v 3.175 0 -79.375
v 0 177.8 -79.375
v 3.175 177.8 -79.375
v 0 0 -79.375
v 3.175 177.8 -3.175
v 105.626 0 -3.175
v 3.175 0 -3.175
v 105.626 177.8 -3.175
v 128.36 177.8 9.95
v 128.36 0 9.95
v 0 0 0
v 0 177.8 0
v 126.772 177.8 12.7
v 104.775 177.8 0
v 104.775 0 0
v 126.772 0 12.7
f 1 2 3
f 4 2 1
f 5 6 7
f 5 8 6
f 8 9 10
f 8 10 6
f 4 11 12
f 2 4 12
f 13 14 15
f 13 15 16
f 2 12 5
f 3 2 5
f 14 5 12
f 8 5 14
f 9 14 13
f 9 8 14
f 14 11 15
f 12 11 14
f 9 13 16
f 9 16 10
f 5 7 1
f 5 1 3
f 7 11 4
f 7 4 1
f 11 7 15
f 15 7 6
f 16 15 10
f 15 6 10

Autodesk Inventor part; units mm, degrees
ref_plane "YZ Plane" through (0, 0, 0) normal (1, 0, 0) x (0, 1, 0)
ref_plane "XZ Plane" through (0, 0, 0) normal (0, 1, 0) x (-1, 0, 0)
ref_plane "XY Plane" through (0, 0, 0) normal (0, 0, 1) x (1, 0, 0)
sketch "Sketch1" plane through (0, 0, 0) normal (1, 0, 0) x (0, 1, 0)
  line L0 (0, 0) -> (177.8, 0)
  line L1 (177.8, 0) -> (177.8, -79.375)
  line L2 (177.8, -79.375) -> (0, -79.375)
  line L3 (0, -79.375) -> (0, 0)
  dimension "d0" = 177.8
  dimension "d1" = 79.375
extrude "Extrusion1" add sketch "Sketch1" along normal blind 3.175
sketch "Sketch2" plane through (3.175, 0, 0) normal (1, 0, 0) x (0, 0, -1)
  line L0 (0, 177.8) -> (0, 0) projected
  line L1 (0, 0) -> (3.175, 0)
  line L2 (3.175, 0) -> (3.175, 177.8)
  line L3 (3.175, 177.8) -> (0, 177.8)
  line L4 (0, 177.8) -> (0, 0)
  dimension "d4" = 3.175
extrude "Extrusion2" add sketch "Sketch2" along normal blind 101.6
sketch "Sketch3" plane through (0, 177.8, 0) normal (0, 1, 0) x (1, 0, 0)
  line L0 (0, 0) -> (104.775, 0) projected
  line L1 (104.775, 0) -> (126.772, -12.7)
  line L2 (126.772, -12.7) -> (128.3595, -9.9504)
  line L3 (128.3595, -9.9504) -> (105.6257, 3.175)
  line L4 (3.175, 3.175) -> (104.775, 3.175) projected
  line L5 (105.6257, 3.175) -> (104.775, 3.175)
  line L6 (3.175, 3.175) -> (104.775, 3.175) projected
  line L7 (104.775, 3.175) -> (104.775, 0) projected
  line L8 (0, 0) -> (104.775, 0) projected
  line L9 (104.775, 3.175) -> (104.775, 0)
  dimension "d7" = 3.175
  dimension "d8" = 25.4
  dimension "d9" = 150
extrude "Extrusion3" add sketch "Sketch3" against normal blind 177.8
properties part number "15102898-16-P-0402" material "Aluminum 6061"
